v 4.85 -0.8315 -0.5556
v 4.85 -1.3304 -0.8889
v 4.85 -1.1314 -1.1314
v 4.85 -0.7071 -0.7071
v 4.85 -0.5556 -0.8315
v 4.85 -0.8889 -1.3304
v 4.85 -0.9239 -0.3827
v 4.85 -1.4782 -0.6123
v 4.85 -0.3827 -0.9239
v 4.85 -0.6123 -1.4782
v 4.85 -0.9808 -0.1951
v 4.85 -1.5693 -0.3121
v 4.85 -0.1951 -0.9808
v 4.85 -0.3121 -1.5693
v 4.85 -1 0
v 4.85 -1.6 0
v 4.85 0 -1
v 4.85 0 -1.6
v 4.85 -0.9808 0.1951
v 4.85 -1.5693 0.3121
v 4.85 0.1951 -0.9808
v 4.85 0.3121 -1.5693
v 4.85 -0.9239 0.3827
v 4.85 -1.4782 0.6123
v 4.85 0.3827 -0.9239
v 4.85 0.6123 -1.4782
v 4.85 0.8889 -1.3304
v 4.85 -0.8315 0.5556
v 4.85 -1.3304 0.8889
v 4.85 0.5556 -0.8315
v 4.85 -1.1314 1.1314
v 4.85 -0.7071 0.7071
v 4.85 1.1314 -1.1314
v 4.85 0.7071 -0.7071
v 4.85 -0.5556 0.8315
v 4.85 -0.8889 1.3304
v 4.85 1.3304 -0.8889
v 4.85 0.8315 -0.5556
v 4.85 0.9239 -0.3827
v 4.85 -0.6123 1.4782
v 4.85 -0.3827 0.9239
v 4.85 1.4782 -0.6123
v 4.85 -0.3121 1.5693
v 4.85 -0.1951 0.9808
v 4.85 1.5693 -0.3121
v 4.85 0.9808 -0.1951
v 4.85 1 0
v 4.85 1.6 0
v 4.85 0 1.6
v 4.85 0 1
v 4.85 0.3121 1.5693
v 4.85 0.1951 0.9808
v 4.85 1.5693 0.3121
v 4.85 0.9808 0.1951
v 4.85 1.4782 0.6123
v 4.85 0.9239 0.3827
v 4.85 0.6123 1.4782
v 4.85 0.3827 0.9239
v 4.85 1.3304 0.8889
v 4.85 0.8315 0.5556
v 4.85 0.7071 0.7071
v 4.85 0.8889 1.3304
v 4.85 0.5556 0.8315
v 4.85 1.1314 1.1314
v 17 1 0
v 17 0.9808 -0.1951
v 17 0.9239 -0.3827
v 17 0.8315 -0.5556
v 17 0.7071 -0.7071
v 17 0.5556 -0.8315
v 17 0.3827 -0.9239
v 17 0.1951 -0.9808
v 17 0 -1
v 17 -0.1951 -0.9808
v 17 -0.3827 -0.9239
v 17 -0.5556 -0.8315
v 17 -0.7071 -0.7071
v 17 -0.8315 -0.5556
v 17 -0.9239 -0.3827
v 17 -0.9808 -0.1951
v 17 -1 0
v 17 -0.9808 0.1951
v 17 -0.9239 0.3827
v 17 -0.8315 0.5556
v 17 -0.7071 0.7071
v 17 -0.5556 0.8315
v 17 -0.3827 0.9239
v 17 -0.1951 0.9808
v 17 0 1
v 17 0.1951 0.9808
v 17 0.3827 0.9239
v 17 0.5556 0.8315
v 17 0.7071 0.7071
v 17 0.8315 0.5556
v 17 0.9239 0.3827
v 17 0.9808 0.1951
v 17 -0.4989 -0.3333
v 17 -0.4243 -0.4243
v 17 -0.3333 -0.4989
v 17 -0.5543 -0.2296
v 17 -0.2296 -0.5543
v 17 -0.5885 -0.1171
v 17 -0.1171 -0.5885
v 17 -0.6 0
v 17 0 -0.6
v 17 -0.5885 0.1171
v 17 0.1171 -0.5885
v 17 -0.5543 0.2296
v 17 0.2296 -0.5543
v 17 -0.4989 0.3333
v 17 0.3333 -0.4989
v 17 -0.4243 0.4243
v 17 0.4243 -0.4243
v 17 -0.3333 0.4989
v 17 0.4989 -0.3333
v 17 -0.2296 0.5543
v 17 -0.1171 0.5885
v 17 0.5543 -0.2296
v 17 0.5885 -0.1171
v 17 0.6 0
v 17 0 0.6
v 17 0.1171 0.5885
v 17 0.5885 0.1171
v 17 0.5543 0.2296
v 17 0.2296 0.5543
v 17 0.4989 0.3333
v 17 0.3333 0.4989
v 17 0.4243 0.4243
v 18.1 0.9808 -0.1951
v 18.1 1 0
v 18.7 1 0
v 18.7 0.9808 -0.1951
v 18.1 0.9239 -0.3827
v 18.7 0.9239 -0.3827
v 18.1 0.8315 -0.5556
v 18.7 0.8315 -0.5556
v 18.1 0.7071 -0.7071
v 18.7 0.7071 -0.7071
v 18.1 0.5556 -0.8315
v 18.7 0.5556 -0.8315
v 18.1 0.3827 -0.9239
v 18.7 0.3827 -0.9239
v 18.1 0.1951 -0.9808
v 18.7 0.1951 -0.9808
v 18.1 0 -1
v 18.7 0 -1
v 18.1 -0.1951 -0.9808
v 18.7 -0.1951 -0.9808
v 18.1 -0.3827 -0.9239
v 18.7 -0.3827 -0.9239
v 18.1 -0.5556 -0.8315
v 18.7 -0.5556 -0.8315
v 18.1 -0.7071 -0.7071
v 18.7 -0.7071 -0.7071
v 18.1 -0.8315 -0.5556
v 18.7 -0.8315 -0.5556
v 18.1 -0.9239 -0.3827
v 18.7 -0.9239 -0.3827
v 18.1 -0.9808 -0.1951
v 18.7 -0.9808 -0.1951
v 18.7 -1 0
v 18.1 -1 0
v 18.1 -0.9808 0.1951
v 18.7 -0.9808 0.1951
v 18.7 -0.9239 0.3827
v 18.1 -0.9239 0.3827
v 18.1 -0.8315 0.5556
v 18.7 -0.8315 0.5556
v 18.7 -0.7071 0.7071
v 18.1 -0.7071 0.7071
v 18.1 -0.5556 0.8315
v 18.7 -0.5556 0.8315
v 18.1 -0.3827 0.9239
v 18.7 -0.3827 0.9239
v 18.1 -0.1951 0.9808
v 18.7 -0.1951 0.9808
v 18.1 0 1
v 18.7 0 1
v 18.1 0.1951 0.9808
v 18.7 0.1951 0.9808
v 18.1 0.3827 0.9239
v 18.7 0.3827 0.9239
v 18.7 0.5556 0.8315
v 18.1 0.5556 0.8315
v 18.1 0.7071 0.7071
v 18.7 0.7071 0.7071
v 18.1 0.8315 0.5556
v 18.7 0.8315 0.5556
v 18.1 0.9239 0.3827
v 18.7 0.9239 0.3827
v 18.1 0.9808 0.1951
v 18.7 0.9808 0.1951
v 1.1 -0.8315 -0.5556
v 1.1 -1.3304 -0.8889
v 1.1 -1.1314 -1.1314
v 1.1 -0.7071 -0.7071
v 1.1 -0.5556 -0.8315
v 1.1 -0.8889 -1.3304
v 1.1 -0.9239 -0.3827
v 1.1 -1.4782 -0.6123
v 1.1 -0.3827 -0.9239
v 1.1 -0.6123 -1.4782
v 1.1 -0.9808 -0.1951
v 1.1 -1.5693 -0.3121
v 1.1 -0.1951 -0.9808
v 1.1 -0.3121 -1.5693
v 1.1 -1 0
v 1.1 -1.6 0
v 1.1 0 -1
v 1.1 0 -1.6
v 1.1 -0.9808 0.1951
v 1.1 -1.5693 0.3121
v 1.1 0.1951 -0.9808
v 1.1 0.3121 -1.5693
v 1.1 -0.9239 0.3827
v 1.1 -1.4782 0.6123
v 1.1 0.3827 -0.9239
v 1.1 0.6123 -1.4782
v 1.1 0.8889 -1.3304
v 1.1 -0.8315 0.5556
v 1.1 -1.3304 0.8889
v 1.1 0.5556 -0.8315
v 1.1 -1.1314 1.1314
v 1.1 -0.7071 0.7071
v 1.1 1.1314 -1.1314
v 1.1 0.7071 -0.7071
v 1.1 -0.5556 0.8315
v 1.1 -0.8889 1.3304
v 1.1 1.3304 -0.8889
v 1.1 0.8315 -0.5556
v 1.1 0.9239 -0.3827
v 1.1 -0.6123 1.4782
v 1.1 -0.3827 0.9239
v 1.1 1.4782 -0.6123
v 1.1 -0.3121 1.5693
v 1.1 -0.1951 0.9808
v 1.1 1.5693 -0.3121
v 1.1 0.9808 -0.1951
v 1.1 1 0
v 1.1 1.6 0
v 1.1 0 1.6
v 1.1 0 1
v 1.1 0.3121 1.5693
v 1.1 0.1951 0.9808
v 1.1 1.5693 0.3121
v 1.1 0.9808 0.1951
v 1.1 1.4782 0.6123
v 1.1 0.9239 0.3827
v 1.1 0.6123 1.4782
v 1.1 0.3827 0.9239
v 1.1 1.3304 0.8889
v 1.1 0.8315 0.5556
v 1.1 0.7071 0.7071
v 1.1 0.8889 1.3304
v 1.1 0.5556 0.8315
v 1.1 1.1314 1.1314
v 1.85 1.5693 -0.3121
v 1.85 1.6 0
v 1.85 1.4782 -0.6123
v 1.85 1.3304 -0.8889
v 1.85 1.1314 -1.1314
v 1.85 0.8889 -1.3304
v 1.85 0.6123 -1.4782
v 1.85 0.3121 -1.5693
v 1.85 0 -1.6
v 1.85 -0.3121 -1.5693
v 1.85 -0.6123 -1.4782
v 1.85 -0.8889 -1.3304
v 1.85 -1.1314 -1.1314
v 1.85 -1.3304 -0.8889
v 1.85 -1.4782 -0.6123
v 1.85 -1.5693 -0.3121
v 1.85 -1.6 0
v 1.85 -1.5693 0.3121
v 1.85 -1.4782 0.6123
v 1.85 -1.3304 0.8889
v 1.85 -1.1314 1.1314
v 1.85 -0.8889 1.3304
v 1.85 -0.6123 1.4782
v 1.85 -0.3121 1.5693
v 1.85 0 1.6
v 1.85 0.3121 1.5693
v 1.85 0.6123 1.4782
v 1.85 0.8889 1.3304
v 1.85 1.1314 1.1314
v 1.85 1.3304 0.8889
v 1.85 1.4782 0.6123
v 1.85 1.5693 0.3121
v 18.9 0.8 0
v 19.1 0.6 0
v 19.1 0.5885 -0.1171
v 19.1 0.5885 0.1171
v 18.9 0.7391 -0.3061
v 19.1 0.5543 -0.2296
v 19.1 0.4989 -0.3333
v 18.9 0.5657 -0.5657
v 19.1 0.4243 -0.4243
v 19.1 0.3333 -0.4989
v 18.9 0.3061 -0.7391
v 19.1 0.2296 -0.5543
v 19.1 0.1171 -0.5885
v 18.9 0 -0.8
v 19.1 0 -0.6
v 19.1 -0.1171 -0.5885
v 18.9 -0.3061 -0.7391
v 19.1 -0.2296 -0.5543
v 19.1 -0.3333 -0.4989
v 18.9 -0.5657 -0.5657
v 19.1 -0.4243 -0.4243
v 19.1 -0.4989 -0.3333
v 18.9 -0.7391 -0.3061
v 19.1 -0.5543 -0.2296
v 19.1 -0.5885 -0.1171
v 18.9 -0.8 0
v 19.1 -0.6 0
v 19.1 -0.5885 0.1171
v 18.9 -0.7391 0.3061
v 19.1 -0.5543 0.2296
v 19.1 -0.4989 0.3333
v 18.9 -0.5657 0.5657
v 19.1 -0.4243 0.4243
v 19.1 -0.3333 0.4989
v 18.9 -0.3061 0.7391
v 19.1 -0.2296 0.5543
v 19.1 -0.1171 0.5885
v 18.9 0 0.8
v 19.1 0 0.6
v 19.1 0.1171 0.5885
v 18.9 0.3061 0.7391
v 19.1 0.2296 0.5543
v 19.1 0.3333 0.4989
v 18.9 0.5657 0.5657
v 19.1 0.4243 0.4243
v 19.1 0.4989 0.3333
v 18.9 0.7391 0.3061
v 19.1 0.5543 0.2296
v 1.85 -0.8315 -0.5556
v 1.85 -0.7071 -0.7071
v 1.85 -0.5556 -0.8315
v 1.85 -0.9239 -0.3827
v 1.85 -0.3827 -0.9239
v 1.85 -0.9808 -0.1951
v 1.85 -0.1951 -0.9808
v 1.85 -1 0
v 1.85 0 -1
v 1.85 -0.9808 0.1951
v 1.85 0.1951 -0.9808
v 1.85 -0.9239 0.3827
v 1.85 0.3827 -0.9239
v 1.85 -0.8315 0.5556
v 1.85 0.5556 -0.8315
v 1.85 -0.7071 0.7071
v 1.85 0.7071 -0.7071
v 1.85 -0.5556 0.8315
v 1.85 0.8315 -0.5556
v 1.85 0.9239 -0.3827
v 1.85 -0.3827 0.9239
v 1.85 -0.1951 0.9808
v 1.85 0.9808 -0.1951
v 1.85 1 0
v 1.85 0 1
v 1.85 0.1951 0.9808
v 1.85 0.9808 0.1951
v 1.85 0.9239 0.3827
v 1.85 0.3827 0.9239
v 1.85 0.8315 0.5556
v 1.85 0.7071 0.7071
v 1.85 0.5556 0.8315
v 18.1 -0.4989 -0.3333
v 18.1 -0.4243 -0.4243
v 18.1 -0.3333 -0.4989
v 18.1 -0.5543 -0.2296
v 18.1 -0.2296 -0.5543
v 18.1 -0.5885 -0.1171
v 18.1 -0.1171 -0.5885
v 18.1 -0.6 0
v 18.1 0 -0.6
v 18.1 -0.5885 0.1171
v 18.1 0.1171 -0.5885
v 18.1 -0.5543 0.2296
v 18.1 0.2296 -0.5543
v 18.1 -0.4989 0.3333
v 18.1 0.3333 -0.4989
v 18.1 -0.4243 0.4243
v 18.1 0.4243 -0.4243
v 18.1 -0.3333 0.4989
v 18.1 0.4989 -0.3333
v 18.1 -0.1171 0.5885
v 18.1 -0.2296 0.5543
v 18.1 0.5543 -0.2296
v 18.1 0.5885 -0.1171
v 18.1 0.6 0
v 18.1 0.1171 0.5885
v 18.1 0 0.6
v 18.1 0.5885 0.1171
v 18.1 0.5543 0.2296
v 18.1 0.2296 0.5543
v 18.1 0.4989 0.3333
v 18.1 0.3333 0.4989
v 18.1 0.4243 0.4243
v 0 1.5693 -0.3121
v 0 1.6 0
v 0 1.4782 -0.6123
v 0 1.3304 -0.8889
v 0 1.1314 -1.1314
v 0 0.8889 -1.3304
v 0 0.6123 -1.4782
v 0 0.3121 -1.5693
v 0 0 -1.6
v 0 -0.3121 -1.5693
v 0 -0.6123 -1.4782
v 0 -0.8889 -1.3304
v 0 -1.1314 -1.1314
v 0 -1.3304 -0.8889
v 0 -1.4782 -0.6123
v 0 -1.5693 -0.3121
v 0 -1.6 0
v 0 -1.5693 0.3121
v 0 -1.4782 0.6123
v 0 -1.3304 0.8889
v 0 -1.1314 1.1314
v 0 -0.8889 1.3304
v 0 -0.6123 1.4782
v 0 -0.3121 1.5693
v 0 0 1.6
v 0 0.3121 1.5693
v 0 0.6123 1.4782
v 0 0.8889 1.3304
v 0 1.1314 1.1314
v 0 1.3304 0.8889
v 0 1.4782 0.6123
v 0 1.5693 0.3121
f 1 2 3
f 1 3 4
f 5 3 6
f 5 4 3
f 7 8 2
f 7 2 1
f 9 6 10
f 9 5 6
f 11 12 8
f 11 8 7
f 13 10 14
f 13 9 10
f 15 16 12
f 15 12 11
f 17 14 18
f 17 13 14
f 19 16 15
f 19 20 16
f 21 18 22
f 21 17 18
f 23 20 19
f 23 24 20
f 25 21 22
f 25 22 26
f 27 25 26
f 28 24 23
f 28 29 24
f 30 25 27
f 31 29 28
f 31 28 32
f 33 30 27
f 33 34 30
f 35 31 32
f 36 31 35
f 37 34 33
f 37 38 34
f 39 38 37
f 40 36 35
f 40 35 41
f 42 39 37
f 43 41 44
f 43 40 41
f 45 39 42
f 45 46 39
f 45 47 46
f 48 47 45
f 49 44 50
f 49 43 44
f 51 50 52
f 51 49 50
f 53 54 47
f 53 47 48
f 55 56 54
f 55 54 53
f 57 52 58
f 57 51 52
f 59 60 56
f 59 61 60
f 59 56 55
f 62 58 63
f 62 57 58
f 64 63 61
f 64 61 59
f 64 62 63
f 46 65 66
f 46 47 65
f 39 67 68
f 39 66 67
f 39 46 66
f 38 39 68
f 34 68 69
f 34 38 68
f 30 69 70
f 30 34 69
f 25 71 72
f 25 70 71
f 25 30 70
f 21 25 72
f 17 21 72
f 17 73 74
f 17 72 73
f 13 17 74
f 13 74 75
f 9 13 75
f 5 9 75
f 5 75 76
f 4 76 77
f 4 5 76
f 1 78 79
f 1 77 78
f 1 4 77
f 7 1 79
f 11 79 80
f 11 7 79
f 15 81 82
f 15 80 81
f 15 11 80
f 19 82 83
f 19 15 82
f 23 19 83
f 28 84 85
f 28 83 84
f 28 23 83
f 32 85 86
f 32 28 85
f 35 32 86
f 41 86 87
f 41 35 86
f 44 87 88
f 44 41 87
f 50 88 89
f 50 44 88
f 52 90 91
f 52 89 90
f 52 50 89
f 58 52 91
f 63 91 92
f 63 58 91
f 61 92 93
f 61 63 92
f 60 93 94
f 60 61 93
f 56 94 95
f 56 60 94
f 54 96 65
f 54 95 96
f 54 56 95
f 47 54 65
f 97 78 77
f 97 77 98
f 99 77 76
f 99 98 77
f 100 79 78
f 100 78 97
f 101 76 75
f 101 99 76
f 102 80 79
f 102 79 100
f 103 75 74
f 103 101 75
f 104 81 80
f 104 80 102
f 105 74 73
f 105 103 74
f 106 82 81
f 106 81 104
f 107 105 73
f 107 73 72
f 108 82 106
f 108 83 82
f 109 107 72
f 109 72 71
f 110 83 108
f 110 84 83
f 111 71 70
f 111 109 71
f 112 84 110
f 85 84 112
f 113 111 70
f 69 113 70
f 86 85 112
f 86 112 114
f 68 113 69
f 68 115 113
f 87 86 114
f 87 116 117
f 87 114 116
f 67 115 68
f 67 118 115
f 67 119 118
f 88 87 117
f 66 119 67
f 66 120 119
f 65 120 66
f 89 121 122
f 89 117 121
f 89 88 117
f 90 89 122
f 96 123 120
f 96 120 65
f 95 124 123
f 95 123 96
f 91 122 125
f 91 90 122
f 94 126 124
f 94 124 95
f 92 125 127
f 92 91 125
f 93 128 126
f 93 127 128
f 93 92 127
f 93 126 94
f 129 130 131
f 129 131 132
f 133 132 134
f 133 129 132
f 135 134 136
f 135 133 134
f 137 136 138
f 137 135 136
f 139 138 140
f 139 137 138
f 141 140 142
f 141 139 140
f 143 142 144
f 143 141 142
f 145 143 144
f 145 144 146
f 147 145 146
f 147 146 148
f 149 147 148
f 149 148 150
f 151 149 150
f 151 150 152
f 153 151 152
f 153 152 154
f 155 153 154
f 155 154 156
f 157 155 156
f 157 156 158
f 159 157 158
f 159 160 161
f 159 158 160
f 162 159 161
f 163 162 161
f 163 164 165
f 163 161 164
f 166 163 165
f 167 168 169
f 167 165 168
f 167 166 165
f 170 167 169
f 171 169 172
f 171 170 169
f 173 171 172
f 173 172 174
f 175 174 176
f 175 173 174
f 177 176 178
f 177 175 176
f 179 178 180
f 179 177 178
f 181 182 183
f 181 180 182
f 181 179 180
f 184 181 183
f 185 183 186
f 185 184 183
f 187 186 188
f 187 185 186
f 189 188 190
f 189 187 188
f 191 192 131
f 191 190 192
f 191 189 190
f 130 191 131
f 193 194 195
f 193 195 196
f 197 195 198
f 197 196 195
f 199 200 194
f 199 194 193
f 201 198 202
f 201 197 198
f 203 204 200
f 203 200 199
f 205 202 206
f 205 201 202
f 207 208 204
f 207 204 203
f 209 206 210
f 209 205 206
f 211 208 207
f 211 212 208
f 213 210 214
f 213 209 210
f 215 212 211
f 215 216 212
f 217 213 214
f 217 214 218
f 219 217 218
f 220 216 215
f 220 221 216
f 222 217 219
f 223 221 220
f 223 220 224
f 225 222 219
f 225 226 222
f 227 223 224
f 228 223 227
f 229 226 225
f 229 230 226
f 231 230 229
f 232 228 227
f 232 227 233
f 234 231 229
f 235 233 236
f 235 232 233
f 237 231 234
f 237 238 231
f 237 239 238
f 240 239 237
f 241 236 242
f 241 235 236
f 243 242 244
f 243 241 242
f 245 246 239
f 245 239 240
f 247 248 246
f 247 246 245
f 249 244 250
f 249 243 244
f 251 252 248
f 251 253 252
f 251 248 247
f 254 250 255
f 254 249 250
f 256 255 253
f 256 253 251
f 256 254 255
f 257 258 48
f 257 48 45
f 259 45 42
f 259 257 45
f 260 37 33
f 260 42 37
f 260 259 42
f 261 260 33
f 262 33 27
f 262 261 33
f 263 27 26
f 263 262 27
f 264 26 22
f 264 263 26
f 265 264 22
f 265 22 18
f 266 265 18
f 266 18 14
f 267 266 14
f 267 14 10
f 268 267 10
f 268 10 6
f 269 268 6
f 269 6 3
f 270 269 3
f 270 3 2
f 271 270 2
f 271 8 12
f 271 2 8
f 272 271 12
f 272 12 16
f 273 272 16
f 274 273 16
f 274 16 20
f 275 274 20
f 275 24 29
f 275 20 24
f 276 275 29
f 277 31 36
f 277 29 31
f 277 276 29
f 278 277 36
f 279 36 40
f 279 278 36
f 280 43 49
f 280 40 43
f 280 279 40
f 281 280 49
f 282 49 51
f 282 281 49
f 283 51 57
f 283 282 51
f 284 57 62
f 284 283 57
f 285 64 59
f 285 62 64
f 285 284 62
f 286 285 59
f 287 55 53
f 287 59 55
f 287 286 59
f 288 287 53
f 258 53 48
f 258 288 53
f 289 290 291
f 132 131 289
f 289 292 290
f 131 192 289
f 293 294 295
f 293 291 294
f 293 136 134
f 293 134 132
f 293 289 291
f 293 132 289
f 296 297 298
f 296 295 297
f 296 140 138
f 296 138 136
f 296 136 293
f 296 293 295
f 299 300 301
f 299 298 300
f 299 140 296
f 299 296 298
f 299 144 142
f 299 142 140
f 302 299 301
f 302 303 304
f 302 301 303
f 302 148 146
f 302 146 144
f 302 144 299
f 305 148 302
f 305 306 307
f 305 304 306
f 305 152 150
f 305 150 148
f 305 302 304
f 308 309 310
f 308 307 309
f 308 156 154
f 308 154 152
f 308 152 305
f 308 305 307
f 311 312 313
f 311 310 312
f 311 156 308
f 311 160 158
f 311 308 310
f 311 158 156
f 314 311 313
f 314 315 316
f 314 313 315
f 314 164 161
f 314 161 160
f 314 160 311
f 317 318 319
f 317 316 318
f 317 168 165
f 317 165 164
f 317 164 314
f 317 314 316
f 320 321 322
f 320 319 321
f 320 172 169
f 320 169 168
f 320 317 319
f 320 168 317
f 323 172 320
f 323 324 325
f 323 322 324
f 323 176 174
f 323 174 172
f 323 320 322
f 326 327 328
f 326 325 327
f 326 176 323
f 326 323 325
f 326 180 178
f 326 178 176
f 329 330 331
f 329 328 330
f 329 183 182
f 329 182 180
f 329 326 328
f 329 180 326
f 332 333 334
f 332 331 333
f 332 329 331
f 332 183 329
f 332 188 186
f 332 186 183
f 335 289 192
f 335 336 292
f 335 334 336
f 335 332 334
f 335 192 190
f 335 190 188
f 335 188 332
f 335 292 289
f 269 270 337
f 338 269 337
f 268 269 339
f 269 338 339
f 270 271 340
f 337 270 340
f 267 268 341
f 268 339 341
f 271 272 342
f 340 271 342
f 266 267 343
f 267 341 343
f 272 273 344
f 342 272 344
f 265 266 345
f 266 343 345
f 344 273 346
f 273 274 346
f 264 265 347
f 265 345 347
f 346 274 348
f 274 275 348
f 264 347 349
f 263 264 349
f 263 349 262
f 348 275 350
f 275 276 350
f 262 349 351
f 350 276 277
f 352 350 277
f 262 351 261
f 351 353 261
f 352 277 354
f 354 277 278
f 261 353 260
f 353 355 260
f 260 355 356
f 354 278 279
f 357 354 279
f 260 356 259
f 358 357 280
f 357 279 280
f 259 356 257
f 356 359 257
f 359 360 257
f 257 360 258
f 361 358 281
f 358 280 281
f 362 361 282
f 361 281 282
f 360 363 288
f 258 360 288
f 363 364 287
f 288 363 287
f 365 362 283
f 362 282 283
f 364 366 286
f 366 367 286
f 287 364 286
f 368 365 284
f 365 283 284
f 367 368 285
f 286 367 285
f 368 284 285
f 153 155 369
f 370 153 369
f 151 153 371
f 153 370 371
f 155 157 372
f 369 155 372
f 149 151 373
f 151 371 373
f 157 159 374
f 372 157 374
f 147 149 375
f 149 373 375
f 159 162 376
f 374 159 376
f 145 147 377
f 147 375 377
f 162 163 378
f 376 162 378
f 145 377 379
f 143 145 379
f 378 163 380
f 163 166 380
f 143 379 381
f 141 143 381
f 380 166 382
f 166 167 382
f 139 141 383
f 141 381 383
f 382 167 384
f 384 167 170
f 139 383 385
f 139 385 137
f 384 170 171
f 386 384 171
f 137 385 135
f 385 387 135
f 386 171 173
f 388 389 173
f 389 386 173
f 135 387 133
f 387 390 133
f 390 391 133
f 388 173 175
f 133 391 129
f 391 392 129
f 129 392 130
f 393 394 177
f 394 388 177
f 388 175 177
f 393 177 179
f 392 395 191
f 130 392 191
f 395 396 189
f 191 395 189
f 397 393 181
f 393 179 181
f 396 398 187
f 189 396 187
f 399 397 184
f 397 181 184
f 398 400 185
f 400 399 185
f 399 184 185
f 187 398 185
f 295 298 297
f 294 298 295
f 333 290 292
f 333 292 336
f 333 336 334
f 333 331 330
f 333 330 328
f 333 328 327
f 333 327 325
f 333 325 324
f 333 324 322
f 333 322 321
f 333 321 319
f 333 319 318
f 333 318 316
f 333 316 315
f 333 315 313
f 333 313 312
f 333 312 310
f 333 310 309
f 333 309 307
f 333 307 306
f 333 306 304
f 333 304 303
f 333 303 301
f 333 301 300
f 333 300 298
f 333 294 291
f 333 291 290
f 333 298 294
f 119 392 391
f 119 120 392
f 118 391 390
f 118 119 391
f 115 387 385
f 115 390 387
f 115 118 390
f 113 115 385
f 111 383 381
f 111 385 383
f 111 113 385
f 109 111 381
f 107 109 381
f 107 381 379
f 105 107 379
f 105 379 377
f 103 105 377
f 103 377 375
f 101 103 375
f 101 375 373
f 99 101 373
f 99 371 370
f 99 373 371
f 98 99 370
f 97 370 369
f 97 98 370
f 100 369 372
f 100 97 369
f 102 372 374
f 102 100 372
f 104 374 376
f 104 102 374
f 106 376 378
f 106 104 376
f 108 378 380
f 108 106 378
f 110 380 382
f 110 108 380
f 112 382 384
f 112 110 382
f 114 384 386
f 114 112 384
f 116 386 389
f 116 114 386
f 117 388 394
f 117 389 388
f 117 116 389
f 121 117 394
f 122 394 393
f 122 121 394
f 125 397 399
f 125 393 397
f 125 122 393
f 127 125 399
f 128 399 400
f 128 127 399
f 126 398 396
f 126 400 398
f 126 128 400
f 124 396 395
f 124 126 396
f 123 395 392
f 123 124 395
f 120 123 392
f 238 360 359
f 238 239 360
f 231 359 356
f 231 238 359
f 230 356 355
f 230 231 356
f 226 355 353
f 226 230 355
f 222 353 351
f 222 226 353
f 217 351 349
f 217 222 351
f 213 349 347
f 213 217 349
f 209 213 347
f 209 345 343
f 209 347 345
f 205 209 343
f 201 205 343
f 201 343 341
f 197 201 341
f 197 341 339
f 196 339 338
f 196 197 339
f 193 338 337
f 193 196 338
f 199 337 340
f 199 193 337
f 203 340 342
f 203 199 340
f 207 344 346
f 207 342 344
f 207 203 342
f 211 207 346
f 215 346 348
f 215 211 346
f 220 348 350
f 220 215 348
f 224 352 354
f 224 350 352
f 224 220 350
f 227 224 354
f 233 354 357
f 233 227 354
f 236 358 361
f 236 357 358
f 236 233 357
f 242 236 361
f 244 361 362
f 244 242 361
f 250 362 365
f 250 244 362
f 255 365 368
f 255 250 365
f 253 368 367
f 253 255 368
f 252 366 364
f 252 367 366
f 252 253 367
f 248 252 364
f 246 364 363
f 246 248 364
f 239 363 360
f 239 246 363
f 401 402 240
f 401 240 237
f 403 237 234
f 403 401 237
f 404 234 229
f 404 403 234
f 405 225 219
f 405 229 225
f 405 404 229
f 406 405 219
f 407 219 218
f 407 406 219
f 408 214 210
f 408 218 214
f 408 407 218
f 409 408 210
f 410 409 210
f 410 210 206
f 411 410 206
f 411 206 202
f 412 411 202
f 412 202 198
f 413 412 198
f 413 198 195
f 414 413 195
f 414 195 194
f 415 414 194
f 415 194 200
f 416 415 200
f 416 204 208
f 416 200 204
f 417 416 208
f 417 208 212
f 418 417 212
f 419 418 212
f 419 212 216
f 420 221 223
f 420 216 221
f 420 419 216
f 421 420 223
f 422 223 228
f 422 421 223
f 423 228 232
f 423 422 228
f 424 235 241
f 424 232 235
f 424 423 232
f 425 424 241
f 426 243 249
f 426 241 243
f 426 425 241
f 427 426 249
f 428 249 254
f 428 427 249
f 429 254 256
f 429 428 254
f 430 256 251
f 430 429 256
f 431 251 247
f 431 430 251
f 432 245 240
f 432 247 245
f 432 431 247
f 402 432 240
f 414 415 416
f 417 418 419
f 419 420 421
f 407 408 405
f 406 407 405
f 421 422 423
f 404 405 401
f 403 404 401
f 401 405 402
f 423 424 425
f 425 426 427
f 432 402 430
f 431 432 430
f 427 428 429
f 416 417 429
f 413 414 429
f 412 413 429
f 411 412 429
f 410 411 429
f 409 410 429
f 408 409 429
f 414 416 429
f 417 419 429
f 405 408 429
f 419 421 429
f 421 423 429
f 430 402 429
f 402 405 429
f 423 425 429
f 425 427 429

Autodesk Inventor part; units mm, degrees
ref_plane "YZ Plane" through (0, 0, 0) normal (1, 0, 0) x (0, 1, 0)
ref_plane "XZ Plane" through (0, 0, 0) normal (0, 1, 0) x (-1, 0, 0)
ref_plane "XY Plane" through (0, 0, 0) normal (0, 0, 1) x (1, 0, 0)
sketch "Sketch1" plane through (0, 0, 0) normal (0, 0, 1) x (1, 0, 0)
  line L0 (0, 0) -> (1.1, 0)
  line L1 (1.1, 0) -> (1.1, 1.6)
  line L2 (1.1, 1.6) -> (0, 1.6)
  line L3 (0, 1.6) -> (0, 0)
  line L4 (1.1, 0) -> (1.85, 0)
  line L5 (1.85, 0) -> (1.85, 1)
  line L6 (1.85, 1) -> (1.1, 1)
  line L7 (1.1, 1) -> (1.1, 0)
  line L8 (1.85, 0) -> (4.85, 0)
  line L9 (4.85, 0) -> (4.85, 1.6)
  line L10 (4.85, 1.6) -> (1.85, 1.6)
  line L11 (1.85, 1.6) -> (1.85, 0)
  line L12 (4.85, 0) -> (17, 0)
  line L13 (17, 0) -> (17, 1)
  line L14 (17, 1) -> (4.85, 1)
  line L15 (4.85, 1) -> (4.85, 0)
  line L16 (17, 0) -> (18.1, 0)
  line L17 (18.1, 0) -> (18.1, 0.6)
  line L18 (18.1, 0.6) -> (17, 0.6)
  line L19 (17, 0.6) -> (17, 0)
  line L20 (18.1, 0) -> (19.1, 0)
  line L21 (19.1, 0) -> (19.1, 1)
  line L22 (19.1, 1) -> (18.1, 1)
  line L23 (18.1, 1) -> (18.1, 0)
  dimension "d0" = 1.1
  dimension "d1" = 1.85
  dimension "d2" = 4.85
  dimension "d3" = 19.1
  dimension "d4" = 18.1
  dimension "d5" = 17
  dimension "d6" = 2
  dimension "d7" = 1.2
  dimension "d8" = 3.2
  dimension "d9" = 2
revolve "Revolution1" add sketch "Sketch1" angle 360 about axis through (0, 0, 0) along (1, 0, 0)
chamfer "Chamfer1" distance 0.4 angle 45 1 edges at (19.1, -1, 0)
properties part number "403-13" material "Steel"
